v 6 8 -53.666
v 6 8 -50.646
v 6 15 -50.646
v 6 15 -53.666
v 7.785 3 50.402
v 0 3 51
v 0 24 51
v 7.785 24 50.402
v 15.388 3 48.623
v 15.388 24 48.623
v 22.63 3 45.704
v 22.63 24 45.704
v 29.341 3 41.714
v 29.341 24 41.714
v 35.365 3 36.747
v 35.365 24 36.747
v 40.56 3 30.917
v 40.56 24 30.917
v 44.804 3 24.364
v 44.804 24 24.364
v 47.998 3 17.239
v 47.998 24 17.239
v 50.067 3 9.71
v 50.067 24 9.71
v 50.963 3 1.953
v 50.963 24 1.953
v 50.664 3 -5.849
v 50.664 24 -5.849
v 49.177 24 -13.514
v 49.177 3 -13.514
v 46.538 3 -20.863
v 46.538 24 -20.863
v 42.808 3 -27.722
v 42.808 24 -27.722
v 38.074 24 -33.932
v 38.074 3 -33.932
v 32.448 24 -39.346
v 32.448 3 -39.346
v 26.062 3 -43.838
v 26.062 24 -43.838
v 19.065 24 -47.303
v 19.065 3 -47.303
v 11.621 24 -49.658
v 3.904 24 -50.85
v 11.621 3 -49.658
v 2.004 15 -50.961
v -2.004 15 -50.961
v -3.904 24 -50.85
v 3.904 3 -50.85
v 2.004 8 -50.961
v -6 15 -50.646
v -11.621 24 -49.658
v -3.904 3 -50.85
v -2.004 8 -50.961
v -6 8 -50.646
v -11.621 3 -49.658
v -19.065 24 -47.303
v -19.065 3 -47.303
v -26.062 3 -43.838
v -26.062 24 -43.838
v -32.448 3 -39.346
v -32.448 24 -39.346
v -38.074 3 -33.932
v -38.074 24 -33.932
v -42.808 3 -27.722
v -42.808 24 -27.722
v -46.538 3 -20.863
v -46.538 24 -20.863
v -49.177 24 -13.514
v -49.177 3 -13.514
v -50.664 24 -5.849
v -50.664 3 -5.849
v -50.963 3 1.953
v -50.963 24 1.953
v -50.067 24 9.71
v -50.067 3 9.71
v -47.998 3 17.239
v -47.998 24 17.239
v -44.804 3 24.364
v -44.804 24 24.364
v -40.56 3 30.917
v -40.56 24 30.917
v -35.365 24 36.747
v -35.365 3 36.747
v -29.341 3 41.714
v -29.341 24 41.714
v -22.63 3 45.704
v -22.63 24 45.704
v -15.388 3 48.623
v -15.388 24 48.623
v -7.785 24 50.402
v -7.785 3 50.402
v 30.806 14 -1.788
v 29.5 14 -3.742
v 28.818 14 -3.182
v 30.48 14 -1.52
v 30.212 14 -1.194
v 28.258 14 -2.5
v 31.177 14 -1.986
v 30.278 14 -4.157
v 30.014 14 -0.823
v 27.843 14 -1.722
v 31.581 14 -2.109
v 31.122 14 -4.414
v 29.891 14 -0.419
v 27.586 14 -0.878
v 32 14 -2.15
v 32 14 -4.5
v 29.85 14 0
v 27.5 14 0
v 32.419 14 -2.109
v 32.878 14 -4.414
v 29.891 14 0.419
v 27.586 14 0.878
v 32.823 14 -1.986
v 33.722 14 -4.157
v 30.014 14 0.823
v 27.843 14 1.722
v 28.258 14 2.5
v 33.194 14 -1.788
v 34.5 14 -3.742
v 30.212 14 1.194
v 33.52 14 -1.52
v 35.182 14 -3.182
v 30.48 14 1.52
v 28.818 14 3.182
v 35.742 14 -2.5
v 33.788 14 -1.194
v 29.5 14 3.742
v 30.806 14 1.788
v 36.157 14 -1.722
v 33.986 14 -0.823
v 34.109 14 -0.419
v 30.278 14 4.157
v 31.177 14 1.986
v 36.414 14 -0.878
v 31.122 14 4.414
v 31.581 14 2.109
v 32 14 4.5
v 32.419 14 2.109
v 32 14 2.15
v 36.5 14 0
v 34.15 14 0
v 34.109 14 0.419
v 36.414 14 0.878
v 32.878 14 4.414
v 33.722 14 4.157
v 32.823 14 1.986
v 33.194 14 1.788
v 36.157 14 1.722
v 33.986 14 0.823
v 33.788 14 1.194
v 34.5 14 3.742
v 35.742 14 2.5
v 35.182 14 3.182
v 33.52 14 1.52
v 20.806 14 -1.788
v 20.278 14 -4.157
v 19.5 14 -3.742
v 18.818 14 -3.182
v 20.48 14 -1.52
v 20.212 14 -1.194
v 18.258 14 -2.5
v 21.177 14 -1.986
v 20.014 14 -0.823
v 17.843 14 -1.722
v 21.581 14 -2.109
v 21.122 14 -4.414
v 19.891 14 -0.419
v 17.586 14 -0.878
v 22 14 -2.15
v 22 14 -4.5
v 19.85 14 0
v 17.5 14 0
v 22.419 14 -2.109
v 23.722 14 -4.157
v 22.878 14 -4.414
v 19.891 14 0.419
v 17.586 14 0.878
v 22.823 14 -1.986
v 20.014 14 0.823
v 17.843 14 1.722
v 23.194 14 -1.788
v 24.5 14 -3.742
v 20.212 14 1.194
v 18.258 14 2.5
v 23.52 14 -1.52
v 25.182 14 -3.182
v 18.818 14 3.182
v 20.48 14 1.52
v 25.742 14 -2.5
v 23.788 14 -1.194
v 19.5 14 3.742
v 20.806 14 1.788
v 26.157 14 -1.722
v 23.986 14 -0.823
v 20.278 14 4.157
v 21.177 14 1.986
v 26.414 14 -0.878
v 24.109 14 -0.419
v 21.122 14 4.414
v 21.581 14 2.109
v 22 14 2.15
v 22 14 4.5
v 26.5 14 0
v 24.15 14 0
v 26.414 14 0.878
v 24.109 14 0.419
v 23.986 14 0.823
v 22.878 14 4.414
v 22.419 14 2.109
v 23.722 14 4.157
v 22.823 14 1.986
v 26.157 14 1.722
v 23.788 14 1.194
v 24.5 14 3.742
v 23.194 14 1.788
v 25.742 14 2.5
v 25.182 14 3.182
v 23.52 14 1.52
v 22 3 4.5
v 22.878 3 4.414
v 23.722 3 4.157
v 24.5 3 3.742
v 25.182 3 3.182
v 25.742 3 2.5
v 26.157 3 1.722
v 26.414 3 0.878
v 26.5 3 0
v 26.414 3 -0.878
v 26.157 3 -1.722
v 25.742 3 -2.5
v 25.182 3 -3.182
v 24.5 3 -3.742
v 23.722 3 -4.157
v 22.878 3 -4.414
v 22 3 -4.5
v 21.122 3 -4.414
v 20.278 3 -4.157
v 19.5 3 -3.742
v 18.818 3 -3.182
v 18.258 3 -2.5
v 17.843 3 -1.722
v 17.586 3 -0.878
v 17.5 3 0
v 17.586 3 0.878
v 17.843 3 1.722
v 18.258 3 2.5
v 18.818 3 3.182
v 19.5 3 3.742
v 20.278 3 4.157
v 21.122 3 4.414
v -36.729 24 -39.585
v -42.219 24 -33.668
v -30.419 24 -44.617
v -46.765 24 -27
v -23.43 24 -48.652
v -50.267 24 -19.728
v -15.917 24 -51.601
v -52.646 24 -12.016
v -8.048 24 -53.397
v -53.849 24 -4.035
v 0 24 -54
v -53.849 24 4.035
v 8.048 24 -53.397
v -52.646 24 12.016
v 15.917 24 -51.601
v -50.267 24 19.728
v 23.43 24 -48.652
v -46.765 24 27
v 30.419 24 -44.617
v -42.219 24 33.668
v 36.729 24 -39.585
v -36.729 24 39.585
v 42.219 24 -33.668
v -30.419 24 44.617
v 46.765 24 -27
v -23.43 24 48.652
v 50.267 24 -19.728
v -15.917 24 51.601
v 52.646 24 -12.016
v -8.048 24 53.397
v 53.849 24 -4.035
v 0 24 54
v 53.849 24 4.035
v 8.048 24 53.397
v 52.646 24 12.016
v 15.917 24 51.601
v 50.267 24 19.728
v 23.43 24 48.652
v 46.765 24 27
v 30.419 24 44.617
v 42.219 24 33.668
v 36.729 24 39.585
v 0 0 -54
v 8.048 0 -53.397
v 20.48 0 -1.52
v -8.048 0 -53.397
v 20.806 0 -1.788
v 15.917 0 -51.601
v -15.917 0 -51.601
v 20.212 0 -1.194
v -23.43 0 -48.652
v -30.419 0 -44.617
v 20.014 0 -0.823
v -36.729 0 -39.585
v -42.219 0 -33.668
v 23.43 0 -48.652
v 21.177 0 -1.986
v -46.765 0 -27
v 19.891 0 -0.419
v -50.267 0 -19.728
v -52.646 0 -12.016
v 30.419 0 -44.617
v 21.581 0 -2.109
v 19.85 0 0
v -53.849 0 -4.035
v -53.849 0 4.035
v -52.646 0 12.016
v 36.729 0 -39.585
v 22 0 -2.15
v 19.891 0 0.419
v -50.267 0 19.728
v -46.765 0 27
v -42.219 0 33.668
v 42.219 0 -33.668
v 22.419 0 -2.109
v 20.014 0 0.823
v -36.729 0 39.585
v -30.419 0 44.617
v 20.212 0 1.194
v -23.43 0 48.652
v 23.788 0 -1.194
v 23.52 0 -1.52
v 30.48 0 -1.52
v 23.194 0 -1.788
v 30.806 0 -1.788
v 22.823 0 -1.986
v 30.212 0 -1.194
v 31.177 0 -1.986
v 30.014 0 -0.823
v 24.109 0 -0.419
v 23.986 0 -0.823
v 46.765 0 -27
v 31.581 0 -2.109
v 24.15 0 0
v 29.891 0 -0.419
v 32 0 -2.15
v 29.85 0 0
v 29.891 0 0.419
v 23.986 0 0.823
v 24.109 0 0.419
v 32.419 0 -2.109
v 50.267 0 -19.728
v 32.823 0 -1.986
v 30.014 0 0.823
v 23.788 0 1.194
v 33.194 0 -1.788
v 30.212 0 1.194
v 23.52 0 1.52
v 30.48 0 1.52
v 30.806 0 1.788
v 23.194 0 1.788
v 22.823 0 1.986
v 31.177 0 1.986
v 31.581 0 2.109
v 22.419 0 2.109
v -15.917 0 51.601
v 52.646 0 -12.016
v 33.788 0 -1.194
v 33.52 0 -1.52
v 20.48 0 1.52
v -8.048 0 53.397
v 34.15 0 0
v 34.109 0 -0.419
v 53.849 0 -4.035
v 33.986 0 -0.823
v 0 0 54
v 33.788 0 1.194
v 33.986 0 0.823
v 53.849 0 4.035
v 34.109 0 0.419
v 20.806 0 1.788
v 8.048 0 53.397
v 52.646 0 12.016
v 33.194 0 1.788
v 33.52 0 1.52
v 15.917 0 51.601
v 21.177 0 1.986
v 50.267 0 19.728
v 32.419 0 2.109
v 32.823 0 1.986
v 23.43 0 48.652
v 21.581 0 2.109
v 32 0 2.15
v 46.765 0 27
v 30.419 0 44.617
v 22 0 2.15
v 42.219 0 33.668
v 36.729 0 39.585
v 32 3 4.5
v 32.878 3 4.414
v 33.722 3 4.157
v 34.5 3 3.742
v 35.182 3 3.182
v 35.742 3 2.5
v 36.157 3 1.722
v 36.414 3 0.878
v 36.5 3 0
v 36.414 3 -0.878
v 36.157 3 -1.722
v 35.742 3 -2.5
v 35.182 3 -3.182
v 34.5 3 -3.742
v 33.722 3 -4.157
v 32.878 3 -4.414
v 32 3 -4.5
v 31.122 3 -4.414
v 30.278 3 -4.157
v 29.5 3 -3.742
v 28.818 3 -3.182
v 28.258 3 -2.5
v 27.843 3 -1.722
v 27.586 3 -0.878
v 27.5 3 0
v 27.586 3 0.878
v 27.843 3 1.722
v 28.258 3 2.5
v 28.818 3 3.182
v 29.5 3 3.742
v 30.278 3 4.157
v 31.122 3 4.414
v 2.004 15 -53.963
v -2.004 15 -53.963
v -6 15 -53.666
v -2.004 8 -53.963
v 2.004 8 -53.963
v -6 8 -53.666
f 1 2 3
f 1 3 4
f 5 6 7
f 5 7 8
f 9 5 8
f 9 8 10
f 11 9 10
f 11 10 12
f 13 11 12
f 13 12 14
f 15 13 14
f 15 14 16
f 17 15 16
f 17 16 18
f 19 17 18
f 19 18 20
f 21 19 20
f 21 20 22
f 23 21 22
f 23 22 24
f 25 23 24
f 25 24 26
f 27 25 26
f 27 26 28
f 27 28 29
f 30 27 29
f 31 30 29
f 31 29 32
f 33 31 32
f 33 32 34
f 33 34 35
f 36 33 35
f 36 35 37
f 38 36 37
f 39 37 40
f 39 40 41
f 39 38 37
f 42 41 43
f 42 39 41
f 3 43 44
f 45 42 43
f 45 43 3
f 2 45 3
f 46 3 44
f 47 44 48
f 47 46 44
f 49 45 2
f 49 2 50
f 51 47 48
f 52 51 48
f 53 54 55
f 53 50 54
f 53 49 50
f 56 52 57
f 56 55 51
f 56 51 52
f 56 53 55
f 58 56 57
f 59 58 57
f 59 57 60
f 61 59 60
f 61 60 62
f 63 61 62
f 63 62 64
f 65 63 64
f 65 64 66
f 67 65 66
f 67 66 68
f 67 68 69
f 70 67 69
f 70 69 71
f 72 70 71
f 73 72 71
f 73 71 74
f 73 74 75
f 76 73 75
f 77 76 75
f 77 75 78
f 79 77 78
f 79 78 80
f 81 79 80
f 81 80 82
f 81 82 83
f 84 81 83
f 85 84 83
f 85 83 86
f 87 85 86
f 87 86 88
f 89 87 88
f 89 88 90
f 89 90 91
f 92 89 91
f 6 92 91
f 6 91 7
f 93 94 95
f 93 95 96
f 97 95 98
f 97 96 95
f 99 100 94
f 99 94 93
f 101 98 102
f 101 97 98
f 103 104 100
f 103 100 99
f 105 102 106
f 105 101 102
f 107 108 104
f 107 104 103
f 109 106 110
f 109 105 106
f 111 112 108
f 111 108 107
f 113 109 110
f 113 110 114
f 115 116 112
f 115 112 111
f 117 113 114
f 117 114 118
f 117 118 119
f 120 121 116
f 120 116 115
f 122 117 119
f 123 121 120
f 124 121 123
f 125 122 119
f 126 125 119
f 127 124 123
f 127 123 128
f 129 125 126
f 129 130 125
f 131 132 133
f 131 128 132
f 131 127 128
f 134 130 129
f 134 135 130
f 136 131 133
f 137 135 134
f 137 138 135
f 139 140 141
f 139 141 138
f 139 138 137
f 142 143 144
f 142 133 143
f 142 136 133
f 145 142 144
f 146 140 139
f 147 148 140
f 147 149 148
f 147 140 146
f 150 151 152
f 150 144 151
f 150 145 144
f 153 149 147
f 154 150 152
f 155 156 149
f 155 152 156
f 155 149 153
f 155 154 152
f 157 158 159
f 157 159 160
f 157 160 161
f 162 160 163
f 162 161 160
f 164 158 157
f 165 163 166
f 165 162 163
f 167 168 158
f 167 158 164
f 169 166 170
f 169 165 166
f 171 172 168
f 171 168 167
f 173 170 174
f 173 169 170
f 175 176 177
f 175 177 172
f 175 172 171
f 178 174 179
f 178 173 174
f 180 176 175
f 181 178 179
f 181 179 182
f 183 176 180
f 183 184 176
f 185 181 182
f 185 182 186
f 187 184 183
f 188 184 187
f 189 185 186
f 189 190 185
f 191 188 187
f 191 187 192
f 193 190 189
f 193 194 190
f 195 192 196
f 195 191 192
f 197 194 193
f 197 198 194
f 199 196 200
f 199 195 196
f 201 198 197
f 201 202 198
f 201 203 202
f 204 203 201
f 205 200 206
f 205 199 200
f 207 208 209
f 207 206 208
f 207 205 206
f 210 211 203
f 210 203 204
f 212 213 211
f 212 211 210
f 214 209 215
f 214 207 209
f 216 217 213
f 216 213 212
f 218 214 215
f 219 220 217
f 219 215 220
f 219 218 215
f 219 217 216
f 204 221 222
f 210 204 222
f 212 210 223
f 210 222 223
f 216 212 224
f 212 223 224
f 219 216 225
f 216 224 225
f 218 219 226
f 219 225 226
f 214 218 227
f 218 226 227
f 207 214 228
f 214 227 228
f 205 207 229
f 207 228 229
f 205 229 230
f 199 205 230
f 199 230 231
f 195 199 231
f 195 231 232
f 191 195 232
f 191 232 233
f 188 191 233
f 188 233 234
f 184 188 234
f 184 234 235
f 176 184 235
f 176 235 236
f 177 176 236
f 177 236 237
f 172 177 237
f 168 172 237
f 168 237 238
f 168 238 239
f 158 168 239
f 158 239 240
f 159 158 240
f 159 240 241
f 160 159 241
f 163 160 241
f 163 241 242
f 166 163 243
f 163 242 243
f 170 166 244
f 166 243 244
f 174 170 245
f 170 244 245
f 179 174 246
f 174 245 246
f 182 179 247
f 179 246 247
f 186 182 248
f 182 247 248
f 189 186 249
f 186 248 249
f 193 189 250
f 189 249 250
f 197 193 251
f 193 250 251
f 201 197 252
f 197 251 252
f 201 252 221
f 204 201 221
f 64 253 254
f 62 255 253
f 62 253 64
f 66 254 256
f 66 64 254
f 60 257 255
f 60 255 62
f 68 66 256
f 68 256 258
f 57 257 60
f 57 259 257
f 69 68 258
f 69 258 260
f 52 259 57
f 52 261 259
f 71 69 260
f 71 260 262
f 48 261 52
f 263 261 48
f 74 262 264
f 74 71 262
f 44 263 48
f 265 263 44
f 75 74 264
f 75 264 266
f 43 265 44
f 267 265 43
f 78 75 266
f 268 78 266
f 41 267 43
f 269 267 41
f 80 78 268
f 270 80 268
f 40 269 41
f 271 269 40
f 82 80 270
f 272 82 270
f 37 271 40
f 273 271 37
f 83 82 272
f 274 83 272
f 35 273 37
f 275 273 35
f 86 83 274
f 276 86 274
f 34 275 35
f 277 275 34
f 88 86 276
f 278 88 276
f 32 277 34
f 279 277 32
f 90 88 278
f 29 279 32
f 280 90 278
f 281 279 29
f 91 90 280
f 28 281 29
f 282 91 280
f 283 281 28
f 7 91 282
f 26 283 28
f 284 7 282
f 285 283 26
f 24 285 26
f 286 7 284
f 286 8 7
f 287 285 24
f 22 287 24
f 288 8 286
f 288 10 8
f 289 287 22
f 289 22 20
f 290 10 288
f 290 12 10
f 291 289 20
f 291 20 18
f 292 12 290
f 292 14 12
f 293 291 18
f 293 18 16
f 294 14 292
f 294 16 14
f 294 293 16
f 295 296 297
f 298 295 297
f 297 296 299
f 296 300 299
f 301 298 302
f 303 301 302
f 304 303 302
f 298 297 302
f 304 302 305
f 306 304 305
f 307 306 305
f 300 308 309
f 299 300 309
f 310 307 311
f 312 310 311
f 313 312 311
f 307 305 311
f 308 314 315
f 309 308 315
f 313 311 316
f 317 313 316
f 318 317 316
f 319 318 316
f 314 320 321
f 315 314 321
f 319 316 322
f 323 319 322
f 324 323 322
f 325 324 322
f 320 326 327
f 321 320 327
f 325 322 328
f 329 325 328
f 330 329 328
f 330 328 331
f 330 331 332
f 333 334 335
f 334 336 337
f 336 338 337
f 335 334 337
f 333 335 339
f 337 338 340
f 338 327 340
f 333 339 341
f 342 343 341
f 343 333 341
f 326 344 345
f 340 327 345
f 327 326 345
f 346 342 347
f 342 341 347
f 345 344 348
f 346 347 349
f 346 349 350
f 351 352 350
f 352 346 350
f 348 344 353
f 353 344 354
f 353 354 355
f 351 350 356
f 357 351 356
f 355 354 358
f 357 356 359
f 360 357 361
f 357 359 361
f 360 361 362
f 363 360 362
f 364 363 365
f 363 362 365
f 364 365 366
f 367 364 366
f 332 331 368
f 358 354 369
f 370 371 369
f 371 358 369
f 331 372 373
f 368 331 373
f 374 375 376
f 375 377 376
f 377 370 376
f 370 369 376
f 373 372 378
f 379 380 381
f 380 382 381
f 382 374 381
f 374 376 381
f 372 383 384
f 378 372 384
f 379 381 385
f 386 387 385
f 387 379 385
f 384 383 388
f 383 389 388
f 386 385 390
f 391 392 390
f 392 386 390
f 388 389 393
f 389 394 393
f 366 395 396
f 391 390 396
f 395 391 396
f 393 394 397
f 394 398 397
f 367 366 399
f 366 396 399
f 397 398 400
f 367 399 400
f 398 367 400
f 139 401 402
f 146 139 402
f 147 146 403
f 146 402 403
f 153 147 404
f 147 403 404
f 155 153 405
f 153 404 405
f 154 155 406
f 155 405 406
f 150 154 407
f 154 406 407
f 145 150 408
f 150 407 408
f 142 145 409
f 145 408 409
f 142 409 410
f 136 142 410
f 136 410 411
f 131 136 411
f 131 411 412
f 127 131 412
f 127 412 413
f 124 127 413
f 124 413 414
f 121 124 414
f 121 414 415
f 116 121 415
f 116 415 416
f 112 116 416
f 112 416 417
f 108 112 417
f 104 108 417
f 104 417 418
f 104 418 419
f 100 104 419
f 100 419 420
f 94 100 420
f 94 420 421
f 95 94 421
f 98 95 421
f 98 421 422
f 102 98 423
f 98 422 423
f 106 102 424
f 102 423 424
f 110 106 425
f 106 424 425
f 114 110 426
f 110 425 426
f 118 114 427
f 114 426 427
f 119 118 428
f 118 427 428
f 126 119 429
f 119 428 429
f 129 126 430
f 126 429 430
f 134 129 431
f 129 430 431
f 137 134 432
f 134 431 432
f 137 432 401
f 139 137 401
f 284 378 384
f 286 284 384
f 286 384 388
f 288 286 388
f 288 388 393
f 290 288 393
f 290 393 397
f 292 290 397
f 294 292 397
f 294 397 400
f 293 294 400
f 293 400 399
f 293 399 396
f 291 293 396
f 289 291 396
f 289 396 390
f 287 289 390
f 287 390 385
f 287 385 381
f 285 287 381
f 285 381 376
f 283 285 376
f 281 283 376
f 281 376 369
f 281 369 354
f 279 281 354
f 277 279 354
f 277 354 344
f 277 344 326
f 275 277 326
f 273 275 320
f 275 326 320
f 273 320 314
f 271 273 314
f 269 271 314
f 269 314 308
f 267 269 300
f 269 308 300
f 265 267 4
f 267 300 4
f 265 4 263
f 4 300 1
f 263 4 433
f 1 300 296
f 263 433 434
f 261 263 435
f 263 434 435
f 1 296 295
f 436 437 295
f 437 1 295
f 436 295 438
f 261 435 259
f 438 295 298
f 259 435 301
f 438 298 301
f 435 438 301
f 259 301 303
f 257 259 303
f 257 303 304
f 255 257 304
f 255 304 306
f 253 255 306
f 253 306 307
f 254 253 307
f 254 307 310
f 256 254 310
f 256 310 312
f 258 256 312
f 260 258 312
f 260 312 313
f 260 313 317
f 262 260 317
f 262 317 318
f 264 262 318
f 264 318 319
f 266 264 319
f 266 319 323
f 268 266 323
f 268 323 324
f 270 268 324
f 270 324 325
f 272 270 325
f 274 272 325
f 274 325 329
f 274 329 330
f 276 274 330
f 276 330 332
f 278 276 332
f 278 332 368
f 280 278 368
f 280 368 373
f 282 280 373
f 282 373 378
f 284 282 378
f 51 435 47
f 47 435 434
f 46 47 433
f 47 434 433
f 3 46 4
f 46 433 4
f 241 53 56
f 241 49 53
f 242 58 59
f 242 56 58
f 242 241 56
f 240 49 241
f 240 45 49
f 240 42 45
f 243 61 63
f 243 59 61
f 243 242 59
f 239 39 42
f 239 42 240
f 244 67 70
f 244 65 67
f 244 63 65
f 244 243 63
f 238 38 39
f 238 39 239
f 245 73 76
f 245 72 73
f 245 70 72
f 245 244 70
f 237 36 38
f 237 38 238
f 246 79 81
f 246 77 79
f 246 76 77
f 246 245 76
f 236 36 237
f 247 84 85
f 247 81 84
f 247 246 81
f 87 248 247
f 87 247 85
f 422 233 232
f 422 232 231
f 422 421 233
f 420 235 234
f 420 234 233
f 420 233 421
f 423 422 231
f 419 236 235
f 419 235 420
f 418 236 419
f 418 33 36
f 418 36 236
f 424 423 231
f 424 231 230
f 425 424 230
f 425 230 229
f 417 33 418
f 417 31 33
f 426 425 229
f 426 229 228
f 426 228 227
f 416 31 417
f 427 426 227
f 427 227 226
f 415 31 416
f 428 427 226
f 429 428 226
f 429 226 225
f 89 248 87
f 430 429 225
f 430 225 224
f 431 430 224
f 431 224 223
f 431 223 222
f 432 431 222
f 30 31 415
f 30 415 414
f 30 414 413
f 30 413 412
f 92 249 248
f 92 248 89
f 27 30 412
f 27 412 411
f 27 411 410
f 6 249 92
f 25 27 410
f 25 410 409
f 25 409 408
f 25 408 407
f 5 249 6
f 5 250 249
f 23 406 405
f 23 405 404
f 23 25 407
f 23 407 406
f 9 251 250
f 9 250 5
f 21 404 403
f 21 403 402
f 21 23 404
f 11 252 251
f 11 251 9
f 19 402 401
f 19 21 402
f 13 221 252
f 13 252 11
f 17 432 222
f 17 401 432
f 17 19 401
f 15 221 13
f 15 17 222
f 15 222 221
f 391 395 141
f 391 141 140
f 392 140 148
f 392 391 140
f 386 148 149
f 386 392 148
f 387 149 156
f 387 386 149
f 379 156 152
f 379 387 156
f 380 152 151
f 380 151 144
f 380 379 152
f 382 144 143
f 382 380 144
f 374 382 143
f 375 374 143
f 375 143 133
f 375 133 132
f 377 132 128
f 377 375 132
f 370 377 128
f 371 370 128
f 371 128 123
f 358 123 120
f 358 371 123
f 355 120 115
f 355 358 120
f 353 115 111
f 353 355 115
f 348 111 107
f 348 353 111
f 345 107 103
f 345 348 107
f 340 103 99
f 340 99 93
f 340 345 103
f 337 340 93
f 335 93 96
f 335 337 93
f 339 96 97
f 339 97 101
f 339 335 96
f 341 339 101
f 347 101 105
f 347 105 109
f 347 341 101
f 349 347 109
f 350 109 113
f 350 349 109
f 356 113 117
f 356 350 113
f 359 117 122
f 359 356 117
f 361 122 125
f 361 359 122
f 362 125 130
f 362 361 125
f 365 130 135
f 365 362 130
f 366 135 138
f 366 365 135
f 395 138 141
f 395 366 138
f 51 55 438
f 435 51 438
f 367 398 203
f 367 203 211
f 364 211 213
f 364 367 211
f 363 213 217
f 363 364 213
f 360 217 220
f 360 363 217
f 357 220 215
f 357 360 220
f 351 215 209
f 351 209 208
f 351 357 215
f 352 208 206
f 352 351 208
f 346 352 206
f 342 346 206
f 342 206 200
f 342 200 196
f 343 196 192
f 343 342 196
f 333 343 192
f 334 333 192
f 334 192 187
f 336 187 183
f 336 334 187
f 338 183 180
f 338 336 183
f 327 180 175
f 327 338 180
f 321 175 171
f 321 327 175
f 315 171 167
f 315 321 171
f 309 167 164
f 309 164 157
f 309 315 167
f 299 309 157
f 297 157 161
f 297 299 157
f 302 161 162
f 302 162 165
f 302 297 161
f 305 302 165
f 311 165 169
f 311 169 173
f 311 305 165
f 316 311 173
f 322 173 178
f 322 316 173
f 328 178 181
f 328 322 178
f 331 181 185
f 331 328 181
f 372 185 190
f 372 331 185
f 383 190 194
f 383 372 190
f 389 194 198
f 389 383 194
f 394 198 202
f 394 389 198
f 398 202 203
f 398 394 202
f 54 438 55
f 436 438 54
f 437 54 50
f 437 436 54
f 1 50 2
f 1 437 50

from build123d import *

# Parameters (mm, degrees)
SKETCH_1_R                     = 54
FLOOR_D108_T3_DEPTH            = 3
SKETCH_2_R                     = 54
SKETCH_2_R_2                   = 51
RIM_OD108_ID102_H24_DEPTH      = 24
SKETCH_3_R                     = 4.5
SENSOR_FIXED_POSTS_DEPTH       = 14
SKETCH_4_R                     = 2.15
M4_FIXED_MOUNT_CLEARANCE_DEPTH = 14
SKETCH_5_W                     = 12
SKETCH_5_H                     = 11
USB_C_SIDE_OPENING_12X7_DEPTH  = 7


with BuildPart() as part:
    # 草图1 → Floor_D108_T3 (new body)
    with BuildSketch(Plane(origin=(0, 0, 0), x_dir=(1, 0, 0), z_dir=(0, 1, 0))):
        with Locations(Location((0, 0, 0), (0, 0, 270))):
            Circle(SKETCH_1_R)
    extrude(amount=FLOOR_D108_T3_DEPTH)

    # 草图2 → Rim_OD108_ID102_H24 (add)
    with BuildSketch(Plane(origin=(0, 0, 0), x_dir=(1, 0, 0), z_dir=(0, 1, 0))):
        with Locations(Location((0, 0, 0), (0, 0, 270))):
            Circle(SKETCH_2_R)
        with Locations(Location((0, 0, 0), (0, 0, 270))):
            Circle(SKETCH_2_R_2, mode=Mode.SUBTRACT)
    extrude(amount=RIM_OD108_ID102_H24_DEPTH)

    # 草图3 → Sensor_fixed_posts (add)
    with BuildSketch(Plane(origin=(0, 0, 0), x_dir=(1, 0, 0), z_dir=(0, 1, 0))):
        with Locations(Location((22, 0, 0), (0, 0, 270))):
            Circle(SKETCH_3_R)
        with Locations(Location((32, 0, 0), (0, 0, 270))):
            Circle(SKETCH_3_R)
    extrude(amount=SENSOR_FIXED_POSTS_DEPTH)

    # 草图4 → M4_fixed_mount_clearance (cut)
    with BuildSketch(Plane(origin=(0, 0, 0), x_dir=(1, 0, 0), z_dir=(0, 1, 0))):
        with Locations(Location((22, 0, 0), (0, 0, 270))):
            Circle(SKETCH_4_R)
        with Locations(Location((32, 0, 0), (0, 0, 270))):
            Circle(SKETCH_4_R)
    extrude(amount=M4_FIXED_MOUNT_CLEARANCE_DEPTH, mode=Mode.SUBTRACT)

    # 草图5 → USB_C_side_opening_12x7 (cut)
    with BuildSketch(Plane(origin=(0, 8, 0), x_dir=(1, 0, 0), z_dir=(0, 1, 0))):
        with Locations((0, 54.5)):
            Rectangle(SKETCH_5_W, SKETCH_5_H)
    extrude(amount=USB_C_SIDE_OPENING_12X7_DEPTH, mode=Mode.SUBTRACT)


solid = part.part
